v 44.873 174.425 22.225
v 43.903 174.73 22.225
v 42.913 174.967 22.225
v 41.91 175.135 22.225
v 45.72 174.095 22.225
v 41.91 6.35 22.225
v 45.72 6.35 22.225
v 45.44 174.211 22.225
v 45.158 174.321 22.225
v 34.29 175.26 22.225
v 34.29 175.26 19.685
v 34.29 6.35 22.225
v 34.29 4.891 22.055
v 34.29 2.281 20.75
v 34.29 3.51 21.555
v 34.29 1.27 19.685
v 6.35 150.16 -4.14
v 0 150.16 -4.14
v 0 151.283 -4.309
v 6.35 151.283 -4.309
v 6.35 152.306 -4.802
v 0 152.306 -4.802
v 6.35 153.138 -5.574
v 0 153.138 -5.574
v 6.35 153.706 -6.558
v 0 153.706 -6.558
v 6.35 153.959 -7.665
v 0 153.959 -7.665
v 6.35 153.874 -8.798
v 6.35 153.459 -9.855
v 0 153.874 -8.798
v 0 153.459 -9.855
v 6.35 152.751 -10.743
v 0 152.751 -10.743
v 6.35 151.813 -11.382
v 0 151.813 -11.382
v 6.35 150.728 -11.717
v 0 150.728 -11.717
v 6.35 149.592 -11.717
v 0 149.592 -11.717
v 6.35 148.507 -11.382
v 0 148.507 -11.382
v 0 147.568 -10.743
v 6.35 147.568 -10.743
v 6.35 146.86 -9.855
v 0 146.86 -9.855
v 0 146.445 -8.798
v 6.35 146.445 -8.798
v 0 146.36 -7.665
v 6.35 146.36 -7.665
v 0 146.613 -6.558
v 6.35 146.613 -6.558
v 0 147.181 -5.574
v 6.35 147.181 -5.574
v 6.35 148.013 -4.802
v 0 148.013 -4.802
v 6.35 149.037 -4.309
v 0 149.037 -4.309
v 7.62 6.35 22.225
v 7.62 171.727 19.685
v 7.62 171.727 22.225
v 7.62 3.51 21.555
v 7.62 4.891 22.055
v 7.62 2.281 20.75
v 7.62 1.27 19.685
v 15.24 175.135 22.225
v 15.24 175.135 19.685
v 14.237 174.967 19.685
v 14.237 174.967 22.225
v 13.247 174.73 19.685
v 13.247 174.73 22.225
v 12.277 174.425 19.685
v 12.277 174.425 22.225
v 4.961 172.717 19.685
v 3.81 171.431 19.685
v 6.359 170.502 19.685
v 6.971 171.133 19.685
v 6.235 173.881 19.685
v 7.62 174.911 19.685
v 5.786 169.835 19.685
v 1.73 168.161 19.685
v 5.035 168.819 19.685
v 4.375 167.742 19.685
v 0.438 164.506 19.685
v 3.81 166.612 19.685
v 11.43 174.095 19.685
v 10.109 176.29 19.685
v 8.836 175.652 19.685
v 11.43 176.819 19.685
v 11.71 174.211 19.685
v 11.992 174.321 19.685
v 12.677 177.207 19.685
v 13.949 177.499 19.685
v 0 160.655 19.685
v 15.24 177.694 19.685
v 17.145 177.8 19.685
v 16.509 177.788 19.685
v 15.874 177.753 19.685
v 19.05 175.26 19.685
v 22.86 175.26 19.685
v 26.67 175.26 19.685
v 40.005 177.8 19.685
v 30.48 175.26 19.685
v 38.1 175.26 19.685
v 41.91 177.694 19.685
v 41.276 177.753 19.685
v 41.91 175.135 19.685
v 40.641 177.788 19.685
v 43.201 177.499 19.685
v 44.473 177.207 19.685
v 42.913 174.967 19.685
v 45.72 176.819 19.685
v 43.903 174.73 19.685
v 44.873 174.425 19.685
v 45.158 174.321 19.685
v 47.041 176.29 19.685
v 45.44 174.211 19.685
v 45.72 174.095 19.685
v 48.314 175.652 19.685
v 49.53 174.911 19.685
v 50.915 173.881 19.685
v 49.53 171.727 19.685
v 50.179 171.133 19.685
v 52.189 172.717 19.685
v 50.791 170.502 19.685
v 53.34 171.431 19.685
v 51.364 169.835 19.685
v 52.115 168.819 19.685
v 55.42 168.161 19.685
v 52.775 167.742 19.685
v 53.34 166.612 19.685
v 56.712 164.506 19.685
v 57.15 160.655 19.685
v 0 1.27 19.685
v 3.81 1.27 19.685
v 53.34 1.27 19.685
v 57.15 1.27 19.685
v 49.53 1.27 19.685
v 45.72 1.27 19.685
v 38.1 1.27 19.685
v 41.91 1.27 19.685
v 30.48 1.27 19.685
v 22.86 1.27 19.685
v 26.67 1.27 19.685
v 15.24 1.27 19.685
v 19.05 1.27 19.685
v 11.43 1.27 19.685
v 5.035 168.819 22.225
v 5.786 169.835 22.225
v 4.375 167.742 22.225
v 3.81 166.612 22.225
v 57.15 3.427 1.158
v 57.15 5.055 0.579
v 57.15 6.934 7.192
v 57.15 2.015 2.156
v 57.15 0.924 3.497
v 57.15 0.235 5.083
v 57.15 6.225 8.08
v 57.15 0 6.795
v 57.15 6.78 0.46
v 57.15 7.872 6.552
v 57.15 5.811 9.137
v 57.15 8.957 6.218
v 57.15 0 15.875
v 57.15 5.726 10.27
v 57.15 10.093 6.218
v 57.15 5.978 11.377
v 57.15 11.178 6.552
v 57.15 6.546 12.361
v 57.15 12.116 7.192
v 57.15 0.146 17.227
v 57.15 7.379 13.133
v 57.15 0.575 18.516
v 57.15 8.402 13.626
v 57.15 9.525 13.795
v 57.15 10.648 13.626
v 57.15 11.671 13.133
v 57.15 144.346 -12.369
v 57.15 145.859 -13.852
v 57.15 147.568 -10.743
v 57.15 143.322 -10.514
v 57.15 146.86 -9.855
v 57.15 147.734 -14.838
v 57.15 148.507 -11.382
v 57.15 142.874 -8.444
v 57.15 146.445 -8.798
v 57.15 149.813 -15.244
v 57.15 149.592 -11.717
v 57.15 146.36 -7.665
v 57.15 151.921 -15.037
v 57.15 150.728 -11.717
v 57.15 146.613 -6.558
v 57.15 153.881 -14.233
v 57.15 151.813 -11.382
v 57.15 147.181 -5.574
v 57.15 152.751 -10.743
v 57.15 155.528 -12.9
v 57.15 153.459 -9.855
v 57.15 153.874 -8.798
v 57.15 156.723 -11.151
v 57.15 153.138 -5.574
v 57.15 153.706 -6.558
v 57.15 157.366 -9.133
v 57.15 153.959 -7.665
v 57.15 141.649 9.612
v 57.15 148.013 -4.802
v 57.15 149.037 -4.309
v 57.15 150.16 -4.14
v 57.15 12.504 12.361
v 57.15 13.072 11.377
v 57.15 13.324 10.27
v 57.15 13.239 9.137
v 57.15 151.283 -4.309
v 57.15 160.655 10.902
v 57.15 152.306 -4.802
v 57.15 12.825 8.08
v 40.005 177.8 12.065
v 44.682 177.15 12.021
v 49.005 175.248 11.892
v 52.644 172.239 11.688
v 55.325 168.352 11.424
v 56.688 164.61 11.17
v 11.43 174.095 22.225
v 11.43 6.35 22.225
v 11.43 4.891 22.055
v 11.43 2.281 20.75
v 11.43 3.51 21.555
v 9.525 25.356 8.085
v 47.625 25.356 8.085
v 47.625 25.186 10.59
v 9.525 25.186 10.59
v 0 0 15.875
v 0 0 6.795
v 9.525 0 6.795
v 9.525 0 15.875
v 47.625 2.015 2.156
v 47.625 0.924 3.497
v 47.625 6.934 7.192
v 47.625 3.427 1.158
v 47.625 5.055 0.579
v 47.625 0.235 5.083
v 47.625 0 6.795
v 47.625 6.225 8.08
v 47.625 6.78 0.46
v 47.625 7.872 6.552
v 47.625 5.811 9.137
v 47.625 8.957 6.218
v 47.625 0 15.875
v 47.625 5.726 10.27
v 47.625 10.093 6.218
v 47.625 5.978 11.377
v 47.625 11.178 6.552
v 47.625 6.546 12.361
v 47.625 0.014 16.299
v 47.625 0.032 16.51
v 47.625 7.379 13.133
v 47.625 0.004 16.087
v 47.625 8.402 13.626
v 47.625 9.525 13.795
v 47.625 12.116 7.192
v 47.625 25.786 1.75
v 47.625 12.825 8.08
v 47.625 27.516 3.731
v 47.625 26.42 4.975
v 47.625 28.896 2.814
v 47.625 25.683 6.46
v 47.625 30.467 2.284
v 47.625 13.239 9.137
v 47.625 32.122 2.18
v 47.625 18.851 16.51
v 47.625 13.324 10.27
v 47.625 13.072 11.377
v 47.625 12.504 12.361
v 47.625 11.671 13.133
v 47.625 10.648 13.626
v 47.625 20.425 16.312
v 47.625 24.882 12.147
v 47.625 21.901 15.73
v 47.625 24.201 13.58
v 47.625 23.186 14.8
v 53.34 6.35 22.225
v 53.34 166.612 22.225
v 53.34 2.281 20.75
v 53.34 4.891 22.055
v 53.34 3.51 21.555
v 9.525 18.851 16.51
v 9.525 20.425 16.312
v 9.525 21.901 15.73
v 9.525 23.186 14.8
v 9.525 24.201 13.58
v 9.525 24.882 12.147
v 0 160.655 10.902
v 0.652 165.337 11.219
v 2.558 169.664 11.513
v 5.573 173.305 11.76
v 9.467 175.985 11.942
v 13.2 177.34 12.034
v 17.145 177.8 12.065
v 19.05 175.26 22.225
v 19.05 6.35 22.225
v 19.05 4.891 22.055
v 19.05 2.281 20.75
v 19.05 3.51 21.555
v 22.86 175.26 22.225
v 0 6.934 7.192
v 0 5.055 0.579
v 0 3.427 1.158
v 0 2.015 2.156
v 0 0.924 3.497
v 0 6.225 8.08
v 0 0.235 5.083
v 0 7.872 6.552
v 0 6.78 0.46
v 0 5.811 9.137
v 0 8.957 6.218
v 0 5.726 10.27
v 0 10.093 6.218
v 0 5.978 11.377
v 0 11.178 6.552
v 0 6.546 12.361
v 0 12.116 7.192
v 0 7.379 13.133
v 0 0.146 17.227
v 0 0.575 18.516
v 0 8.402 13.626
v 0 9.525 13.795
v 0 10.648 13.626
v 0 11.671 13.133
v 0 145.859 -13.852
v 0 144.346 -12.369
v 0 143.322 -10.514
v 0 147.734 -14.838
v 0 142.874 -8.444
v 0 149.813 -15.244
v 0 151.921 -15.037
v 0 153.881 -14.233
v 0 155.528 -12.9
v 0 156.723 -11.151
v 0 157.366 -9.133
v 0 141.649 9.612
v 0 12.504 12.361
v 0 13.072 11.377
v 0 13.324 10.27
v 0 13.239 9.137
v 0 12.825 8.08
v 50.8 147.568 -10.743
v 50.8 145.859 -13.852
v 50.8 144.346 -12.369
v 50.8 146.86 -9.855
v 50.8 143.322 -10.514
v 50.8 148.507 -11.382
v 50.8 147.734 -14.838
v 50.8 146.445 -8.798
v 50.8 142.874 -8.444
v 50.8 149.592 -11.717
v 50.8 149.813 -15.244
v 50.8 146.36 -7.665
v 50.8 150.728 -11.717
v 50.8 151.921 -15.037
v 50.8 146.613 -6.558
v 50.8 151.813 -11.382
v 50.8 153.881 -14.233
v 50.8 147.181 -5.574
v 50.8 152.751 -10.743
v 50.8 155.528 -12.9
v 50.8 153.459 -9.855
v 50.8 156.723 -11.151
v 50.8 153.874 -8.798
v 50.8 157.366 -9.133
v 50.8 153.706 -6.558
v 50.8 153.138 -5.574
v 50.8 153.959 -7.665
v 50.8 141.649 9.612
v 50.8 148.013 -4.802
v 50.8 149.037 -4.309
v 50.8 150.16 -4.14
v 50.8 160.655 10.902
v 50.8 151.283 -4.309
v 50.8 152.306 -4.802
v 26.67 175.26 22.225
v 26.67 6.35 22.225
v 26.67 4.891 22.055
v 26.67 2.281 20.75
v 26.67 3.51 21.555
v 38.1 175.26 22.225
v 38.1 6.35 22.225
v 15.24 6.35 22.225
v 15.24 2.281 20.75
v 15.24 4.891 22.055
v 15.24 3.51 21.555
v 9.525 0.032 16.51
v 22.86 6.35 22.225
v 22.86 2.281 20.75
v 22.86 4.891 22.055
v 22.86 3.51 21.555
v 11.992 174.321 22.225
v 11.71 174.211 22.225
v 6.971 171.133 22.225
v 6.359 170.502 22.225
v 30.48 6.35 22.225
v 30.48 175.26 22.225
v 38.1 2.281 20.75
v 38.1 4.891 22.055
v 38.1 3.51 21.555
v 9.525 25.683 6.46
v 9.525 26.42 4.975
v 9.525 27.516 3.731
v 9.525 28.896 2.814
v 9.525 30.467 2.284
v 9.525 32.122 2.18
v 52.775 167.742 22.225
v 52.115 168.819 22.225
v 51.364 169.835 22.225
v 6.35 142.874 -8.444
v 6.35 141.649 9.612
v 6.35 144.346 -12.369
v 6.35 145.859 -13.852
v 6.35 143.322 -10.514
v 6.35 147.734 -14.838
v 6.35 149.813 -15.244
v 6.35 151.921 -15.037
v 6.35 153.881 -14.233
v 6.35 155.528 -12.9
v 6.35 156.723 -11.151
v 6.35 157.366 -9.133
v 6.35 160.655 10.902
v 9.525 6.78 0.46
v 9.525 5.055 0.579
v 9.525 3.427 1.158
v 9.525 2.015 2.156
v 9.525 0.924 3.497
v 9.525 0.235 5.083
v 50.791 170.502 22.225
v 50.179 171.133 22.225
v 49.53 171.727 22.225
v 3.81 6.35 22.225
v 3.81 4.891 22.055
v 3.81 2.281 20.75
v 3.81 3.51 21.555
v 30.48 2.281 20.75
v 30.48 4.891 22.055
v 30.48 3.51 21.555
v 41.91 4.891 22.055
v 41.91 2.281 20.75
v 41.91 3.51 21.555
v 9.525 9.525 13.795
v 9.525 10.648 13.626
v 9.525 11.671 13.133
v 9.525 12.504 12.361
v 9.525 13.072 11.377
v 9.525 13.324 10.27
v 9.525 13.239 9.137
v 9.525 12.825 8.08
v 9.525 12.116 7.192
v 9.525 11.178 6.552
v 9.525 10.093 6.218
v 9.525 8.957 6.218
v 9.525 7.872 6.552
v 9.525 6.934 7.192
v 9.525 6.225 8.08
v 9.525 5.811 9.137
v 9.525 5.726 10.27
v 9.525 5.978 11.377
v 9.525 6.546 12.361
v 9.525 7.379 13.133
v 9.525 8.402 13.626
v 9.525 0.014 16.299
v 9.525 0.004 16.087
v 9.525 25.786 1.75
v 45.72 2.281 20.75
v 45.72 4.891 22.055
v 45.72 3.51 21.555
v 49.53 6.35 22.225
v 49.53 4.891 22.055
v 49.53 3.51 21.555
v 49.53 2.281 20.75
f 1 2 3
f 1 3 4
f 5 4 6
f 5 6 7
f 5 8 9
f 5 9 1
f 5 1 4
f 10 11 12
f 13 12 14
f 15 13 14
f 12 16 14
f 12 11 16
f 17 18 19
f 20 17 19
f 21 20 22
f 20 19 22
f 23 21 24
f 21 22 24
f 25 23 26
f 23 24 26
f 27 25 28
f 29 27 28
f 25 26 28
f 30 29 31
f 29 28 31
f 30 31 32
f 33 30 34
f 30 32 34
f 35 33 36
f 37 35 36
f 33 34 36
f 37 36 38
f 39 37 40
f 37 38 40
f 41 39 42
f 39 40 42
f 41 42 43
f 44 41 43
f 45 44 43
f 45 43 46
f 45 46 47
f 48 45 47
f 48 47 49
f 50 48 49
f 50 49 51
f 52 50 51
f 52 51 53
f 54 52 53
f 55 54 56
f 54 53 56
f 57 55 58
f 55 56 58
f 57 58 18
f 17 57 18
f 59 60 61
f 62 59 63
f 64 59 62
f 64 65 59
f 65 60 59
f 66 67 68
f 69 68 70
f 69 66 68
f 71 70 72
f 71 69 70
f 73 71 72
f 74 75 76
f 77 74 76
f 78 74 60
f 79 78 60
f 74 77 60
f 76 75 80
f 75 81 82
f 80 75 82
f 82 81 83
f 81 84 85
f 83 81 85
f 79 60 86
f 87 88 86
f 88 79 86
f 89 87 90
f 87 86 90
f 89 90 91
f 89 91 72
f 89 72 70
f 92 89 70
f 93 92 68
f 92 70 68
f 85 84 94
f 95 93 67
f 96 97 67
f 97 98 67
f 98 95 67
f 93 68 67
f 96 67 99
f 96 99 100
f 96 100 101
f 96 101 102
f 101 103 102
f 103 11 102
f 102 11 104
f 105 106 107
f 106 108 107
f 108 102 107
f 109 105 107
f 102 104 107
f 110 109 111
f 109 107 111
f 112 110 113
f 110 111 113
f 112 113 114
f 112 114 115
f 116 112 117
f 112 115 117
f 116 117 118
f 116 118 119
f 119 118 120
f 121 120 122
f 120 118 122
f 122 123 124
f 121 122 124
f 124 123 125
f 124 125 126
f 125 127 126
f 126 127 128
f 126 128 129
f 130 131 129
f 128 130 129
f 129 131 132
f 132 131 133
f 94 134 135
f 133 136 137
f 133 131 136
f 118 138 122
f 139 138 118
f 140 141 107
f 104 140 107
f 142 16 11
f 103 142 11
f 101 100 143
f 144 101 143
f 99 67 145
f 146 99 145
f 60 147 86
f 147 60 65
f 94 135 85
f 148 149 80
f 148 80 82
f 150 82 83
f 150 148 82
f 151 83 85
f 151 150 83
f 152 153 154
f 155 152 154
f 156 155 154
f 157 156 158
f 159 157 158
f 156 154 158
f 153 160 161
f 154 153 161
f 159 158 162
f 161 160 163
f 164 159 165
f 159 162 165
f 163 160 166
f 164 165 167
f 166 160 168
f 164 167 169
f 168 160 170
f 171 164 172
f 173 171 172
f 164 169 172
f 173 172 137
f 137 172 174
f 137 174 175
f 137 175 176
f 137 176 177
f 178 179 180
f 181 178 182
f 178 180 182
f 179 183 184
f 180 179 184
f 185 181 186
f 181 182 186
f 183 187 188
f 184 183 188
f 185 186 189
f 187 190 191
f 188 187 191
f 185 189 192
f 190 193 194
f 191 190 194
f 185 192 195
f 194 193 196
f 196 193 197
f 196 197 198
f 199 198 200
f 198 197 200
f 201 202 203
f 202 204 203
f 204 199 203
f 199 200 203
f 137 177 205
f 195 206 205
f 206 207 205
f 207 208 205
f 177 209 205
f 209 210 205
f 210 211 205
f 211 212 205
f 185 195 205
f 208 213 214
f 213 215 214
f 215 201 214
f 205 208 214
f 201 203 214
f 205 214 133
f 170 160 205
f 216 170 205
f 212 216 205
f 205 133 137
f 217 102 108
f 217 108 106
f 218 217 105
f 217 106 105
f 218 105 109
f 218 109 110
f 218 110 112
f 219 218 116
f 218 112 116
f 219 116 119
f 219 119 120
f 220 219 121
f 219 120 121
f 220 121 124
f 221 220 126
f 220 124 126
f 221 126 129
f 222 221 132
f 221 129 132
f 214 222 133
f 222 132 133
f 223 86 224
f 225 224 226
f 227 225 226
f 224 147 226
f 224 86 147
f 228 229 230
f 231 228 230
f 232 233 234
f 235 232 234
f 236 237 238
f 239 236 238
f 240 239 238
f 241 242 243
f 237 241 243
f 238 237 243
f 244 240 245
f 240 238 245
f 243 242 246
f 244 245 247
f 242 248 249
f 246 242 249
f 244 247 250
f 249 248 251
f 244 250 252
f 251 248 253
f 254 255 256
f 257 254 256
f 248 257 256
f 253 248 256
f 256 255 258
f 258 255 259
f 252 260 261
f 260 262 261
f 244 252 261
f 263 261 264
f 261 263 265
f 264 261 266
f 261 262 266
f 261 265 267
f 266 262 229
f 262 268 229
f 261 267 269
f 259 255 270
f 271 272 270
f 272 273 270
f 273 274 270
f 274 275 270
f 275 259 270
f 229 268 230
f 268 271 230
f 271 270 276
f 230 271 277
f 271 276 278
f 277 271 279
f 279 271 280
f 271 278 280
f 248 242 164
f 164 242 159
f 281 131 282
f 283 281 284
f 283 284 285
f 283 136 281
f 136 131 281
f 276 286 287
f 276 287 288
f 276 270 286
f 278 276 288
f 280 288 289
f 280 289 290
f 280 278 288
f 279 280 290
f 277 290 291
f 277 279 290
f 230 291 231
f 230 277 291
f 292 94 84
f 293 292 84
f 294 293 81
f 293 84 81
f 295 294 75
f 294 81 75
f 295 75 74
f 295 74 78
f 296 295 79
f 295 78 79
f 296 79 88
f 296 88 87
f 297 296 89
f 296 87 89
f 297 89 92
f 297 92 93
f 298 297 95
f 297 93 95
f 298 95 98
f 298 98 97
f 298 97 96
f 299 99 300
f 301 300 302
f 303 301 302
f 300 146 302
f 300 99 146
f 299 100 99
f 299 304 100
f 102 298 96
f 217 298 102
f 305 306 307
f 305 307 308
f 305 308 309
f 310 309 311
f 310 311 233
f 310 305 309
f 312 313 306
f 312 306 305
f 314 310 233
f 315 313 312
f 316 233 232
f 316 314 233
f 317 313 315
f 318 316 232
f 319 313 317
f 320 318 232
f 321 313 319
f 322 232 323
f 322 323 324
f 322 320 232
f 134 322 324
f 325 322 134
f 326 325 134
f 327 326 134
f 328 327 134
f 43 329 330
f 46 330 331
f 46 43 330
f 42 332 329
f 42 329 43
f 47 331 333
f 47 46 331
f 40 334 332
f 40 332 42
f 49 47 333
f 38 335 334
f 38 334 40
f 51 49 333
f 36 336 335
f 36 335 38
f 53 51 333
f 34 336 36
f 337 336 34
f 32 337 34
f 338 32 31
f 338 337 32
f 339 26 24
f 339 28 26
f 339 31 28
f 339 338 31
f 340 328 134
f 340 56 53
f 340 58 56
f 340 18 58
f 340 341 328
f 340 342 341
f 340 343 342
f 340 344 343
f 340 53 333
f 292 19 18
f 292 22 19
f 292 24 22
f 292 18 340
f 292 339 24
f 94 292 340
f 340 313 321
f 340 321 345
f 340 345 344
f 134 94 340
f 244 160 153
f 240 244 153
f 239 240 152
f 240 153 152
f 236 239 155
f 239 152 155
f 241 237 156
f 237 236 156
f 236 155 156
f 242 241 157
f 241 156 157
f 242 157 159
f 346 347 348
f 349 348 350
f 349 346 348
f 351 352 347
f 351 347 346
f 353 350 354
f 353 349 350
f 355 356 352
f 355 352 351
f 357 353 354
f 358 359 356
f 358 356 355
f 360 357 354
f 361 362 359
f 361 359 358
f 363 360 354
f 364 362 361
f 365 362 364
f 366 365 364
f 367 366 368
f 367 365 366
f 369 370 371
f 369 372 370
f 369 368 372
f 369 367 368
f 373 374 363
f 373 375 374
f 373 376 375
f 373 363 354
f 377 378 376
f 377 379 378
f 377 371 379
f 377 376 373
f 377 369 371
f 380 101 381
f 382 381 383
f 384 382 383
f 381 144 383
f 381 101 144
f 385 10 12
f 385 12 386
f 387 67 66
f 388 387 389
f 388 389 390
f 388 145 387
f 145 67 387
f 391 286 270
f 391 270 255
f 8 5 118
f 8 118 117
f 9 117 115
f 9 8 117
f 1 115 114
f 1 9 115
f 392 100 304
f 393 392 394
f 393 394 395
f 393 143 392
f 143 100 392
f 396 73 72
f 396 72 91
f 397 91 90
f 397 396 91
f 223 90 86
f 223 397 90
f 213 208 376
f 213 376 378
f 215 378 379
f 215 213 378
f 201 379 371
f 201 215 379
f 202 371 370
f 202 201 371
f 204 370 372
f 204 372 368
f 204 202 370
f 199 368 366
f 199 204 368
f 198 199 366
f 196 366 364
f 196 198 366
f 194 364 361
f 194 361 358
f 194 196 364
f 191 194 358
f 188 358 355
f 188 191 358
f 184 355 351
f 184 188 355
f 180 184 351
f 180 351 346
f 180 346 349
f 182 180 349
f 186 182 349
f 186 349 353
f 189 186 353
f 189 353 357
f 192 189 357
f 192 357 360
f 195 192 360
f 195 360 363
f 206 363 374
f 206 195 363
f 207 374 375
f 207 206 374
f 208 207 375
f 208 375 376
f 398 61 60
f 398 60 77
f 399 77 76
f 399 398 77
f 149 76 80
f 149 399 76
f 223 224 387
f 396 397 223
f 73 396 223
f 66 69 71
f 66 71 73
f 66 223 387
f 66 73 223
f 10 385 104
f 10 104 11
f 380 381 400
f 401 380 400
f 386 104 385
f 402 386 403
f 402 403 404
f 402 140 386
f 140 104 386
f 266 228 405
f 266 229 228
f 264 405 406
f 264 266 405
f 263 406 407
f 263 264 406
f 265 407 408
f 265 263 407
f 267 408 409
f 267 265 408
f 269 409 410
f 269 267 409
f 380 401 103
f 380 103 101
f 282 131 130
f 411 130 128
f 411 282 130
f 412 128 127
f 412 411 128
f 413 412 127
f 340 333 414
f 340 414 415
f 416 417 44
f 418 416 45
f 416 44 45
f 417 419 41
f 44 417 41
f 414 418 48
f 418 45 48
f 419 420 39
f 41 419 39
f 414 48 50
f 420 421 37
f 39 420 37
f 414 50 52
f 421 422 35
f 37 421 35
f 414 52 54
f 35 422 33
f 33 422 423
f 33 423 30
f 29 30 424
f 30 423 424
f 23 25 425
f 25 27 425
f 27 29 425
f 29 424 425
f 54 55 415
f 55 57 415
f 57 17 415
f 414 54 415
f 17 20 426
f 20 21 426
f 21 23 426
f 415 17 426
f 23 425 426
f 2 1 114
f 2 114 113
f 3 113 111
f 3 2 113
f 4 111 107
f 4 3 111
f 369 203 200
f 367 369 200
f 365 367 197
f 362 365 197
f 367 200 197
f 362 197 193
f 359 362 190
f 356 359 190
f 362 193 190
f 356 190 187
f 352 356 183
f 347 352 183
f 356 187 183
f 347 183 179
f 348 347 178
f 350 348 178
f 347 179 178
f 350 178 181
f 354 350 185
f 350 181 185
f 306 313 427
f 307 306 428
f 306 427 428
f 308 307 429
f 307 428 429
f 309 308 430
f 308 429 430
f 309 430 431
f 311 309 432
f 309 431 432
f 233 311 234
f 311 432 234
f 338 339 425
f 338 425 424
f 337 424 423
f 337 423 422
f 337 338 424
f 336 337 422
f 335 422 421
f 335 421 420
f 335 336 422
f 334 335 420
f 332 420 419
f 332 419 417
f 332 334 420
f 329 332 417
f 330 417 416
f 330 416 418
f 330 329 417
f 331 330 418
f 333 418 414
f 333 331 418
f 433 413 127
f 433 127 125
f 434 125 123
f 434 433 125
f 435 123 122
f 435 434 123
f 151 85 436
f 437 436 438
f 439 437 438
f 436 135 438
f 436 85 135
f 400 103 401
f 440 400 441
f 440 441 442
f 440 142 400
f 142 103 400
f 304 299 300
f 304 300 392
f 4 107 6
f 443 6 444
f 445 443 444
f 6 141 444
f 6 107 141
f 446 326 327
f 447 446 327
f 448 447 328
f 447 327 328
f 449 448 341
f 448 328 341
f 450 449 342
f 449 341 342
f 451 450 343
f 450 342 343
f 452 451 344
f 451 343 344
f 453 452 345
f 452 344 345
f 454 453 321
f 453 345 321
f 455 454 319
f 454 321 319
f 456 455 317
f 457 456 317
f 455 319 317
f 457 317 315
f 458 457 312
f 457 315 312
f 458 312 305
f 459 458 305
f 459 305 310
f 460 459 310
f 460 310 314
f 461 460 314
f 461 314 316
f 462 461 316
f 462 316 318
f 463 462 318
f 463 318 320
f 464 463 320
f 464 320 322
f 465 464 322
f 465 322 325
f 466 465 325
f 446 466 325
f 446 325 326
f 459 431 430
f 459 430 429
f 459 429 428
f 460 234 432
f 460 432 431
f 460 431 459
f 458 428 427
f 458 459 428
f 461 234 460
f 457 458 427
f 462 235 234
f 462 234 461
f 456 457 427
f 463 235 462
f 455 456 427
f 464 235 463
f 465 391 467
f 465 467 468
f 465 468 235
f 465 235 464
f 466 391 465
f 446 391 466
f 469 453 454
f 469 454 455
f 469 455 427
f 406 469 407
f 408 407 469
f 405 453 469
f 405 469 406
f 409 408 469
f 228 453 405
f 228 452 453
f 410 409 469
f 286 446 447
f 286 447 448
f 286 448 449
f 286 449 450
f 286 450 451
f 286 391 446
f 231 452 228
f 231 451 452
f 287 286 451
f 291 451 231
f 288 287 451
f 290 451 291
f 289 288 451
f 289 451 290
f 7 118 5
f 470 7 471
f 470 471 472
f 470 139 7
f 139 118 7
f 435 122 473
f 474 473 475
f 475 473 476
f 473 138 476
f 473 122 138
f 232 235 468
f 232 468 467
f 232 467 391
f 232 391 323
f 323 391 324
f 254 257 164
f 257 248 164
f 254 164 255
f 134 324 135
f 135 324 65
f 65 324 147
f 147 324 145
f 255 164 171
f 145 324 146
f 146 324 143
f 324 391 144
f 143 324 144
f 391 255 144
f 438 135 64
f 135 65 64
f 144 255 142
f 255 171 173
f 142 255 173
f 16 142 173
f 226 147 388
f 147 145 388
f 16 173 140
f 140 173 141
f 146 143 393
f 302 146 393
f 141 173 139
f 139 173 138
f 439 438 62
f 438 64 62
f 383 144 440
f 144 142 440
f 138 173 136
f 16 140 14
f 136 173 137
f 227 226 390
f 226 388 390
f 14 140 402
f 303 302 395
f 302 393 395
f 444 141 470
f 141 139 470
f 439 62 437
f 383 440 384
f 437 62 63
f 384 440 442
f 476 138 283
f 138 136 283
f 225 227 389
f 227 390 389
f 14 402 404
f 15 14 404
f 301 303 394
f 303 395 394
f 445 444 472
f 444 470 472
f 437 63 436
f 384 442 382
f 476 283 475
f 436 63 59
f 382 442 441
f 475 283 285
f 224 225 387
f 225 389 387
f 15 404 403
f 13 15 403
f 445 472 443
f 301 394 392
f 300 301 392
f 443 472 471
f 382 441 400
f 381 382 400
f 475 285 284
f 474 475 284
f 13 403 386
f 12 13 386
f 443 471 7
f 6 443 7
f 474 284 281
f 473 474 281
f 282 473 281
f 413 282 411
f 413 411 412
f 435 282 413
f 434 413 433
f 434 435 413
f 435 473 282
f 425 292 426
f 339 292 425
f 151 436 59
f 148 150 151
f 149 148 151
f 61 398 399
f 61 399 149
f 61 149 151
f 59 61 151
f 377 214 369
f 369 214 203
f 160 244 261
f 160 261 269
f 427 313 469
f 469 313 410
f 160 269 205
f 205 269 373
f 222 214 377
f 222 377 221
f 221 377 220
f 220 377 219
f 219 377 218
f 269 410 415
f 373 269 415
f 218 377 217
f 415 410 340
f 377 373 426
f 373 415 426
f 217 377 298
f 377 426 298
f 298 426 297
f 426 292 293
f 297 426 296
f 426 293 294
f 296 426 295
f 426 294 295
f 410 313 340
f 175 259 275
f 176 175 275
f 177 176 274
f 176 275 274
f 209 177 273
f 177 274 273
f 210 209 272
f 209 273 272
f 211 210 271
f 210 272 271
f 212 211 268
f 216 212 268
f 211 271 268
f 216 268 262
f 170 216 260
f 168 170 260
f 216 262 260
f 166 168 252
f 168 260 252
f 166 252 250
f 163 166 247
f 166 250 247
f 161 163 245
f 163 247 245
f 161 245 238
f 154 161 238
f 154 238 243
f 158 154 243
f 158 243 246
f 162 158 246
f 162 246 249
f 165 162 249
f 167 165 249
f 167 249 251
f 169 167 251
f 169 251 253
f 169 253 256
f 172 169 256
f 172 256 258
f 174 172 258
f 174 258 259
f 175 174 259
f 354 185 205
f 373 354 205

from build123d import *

# Parameters (mm, degrees)
SKETCH1_W              = 57.15
SKETCH1_H              = 177.8
BOSS_EXTRUDE1_DEPTH    = 22.225
CUT_EXTRUDE1_DEPTH     = 149.86
FILLET1_R              = 17.145
FILLET2_R              = 6.35
SKETCH4_W              = 3.81
SKETCH4_H              = 2.54
CUT_EXTRUDE2_DEPTH     = 215.392
CUT_EXTRUDE5_START     = 14.224
CUT_EXTRUDE5_DEPTH     = 14.224
SKETCH6_R              = 3.81
CUT_EXTRUDE6_DEPTH     = 117.856
SKETCH7_R              = 3.81
BOSS_EXTRUDE2_DEPTH    = 6.35
CUT_EXTRUDE7_START     = 9.525
CUT_EXTRUDE7_OUTLINE_R = 3.81
CUT_EXTRUDE7_DEPTH     = 38.1
FILLET3_R              = 6.35


# Read off the part's stored shape, not the designer's step: Cut-Extrude7
with BuildPart() as part:
    # Sketch1 → Boss-Extrude1 (new body)
    with BuildSketch(Plane.XY):
        with Locations((28.575, 88.9)):
            Rectangle(SKETCH1_W, SKETCH1_H)
    extrude(amount=BOSS_EXTRUDE1_DEPTH)

    # Sketch3 → Cut-Extrude1 (cut)
    with BuildSketch(Plane.ZY):
        Polygon((0, 0), (12.065, 177.8), (0, 177.8), align=None)
    extrude(amount=-CUT_EXTRUDE1_DEPTH, mode=Mode.SUBTRACT)

    # Fillet1
    fillet1_edges = [part.edges().sort_by_distance(p)[0] for p in [
        (0, 177.8, 17.145),
        (57.15, 177.8, 17.145),
    ]]
    fillet(fillet1_edges, radius=FILLET1_R)

    # Fillet2
    fillet2_edges = [part.edges().sort_by_distance(p)[0] for p in [
        (28.575, 0, 0),
        (28.575, 0, 22.225),
    ]]
    fillet(fillet2_edges, radius=FILLET2_R)

    # Sketch4 → Cut-Extrude2 (cut)
    with BuildSketch(Plane.XZ):
        with Locations((1.905, 20.955)):
            Rectangle(SKETCH4_W, SKETCH4_H)
        with Locations((9.525, 20.955)):
            Rectangle(SKETCH4_W, SKETCH4_H)
        with Locations((17.145, 20.955)):
            Rectangle(SKETCH4_W, SKETCH4_H)
        with Locations((24.765, 20.955)):
            Rectangle(SKETCH4_W, SKETCH4_H)
        with Locations((32.385, 20.955)):
            Rectangle(SKETCH4_W, SKETCH4_H)
        with Locations((40.005, 20.955)):
            Rectangle(SKETCH4_W, SKETCH4_H)
        with Locations((47.625, 20.955)):
            Rectangle(SKETCH4_W, SKETCH4_H)
        with Locations((55.245, 20.955)):
            Rectangle(SKETCH4_W, SKETCH4_H)
    extrude(amount=-CUT_EXTRUDE2_DEPTH, mode=Mode.SUBTRACT)

    # Sketch5 → Cut-Extrude5 (cut)
    with BuildSketch(Plane.XY.offset(19.685).offset(CUT_EXTRUDE5_START)):
        with BuildLine():
            Line((2.54, 160.655), (0, 160.655))
            ThreePointArc((0, 160.655), (0.980538982, 166.37), (3.81, 171.431307345))
            ThreePointArc((3.81, 171.431307345), (5.583362193, 173.315156248), (7.62, 174.910714644))
            ThreePointArc((7.62, 174.910714644), (9.46546693, 175.983920276), (11.43, 176.819461018))
            ThreePointArc((11.43, 176.819461018), (13.309998856, 177.365589195), (15.24, 177.693837989))
            ThreePointArc((15.24, 177.693837989), (16.191022095, 177.773438923), (17.145, 177.8))
            Line((17.145, 177.8), (19.05, 177.8))
            Line((19.05, 177.8), (22.86, 177.8))
            Line((22.86, 177.8), (26.67, 177.8))
            Line((26.67, 177.8), (30.48, 177.8))
            Line((30.48, 177.8), (34.29, 177.8))
            Line((34.29, 177.8), (38.1, 177.8))
            Line((38.1, 177.8), (40.005, 177.8))
            ThreePointArc((40.005, 177.8), (40.958977905, 177.773438923), (41.91, 177.693837989))
            ThreePointArc((41.91, 177.693837989), (43.840001144, 177.365589195), (45.72, 176.819461018))
            ThreePointArc((45.72, 176.819461018), (47.68453307, 175.983920276), (49.53, 174.910714644))
            ThreePointArc((49.53, 174.910714644), (51.566637807, 173.315156248), (53.34, 171.431307345))
            ThreePointArc((53.34, 171.431307345), (56.169461018, 166.37), (57.15, 160.655))
            Line((57.15, 160.655), (54.61, 160.655))
            ThreePointArc((54.61, 160.655), (53.774726052, 165.523333333), (51.364444444, 169.834817368))
            ThreePointArc((51.364444444, 169.834817368), (49.853802577, 171.439577544), (48.118888889, 172.798756919))
            ThreePointArc((48.118888889, 172.798756919), (46.546824467, 173.712969124), (44.873333333, 174.424726052))
            ThreePointArc((44.873333333, 174.424726052), (43.271852826, 174.889946351), (41.627777778, 175.169565694))
            ThreePointArc((41.627777778, 175.169565694), (40.817647845, 175.237373897), (40.005, 175.26))
            Line((40.005, 175.26), (38.1, 175.26))
            Line((38.1, 175.26), (34.29, 175.26))
            Line((34.29, 175.26), (30.48, 175.26))
            Line((30.48, 175.26), (26.67, 175.26))
            Line((26.67, 175.26), (22.86, 175.26))
            Line((22.86, 175.26), (19.05, 175.26))
            Line((19.05, 175.26), (17.145, 175.26))
            ThreePointArc((17.145, 175.26), (16.332352155, 175.237373897), (15.522222222, 175.169565694))
            ThreePointArc((15.522222222, 175.169565694), (13.878147174, 174.889946351), (12.276666667, 174.424726052))
            ThreePointArc((12.276666667, 174.424726052), (10.603175533, 173.712969124), (9.031111111, 172.798756919))
            ThreePointArc((9.031111111, 172.798756919), (7.296197423, 171.439577544), (5.785555556, 169.834817368))
            ThreePointArc((5.785555556, 169.834817368), (3.375273948, 165.523333333), (2.54, 160.655))
        make_face()
    extrude(amount=-CUT_EXTRUDE5_DEPTH, mode=Mode.SUBTRACT)

    # Sketch6 → Cut-Extrude6 (cut)
    with BuildSketch(Plane.ZY):
        with Locations((9.98506493, 9.525)):
            Circle(SKETCH6_R)
    extrude(amount=-CUT_EXTRUDE6_DEPTH, mode=Mode.SUBTRACT)

    # Sketch7 → Boss-Extrude2 (add)
    with BuildSketch(Plane.ZY):
        with BuildLine():
            Line((9.611876604, 141.648707852), (10.901589286, 160.655))
            Line((10.901589286, 160.655), (-9.13281329, 157.365703773))
            ThreePointArc((-9.13281329, 157.365703773), (-15.243978439, 149.813024962), (-8.444101503, 142.873934938))
            Line((-8.444101503, 142.873934938), (9.611876604, 141.648707852))
        make_face()
        with Locations((-7.949711075, 150.159680223)):
            Circle(SKETCH7_R, mode=Mode.SUBTRACT)
    boss_extrude2 = extrude(amount=-BOSS_EXTRUDE2_DEPTH)

    # Mirror1: Boss-Extrude2 across plane
    add(boss_extrude2.mirror(Plane.ZY.offset(-28.575)))

    # Cut-Extrude7 outline → Cut-Extrude7 (cut)
    with BuildSketch(Plane.YZ.offset(CUT_EXTRUDE7_START)):
        with BuildLine():
            Line((6.779904227, 0.46006493), (25.786196375, 1.749777611))
            Line((25.786196375, 1.749777611), (24.784609855, 16.51))
            Line((24.784609855, 16.51), (0.031829774, 16.51))
            ThreePointArc((0.031829774, 16.51), (0.007962436, 16.192898622), (0, 15.875))
            Line((0, 15.875), (0, 6.795495646))
            ThreePointArc((0, 6.795495646), (2.014529544, 2.155862479), (6.779904227, 0.46006493))
        make_face()
        with Locations((9.525, 9.98506493)):
            Circle(CUT_EXTRUDE7_OUTLINE_R, mode=Mode.SUBTRACT)
    extrude(amount=CUT_EXTRUDE7_DEPTH, mode=Mode.SUBTRACT)

    # Fillet3
    fillet3_edges = [part.edges().sort_by_distance(p)[0] for p in [
        (28.575, 25.786196375, 1.749777611),
        (28.575, 24.784609855, 16.51),
    ]]
    fillet(fillet3_edges, radius=FILLET3_R)


solid = part.part
